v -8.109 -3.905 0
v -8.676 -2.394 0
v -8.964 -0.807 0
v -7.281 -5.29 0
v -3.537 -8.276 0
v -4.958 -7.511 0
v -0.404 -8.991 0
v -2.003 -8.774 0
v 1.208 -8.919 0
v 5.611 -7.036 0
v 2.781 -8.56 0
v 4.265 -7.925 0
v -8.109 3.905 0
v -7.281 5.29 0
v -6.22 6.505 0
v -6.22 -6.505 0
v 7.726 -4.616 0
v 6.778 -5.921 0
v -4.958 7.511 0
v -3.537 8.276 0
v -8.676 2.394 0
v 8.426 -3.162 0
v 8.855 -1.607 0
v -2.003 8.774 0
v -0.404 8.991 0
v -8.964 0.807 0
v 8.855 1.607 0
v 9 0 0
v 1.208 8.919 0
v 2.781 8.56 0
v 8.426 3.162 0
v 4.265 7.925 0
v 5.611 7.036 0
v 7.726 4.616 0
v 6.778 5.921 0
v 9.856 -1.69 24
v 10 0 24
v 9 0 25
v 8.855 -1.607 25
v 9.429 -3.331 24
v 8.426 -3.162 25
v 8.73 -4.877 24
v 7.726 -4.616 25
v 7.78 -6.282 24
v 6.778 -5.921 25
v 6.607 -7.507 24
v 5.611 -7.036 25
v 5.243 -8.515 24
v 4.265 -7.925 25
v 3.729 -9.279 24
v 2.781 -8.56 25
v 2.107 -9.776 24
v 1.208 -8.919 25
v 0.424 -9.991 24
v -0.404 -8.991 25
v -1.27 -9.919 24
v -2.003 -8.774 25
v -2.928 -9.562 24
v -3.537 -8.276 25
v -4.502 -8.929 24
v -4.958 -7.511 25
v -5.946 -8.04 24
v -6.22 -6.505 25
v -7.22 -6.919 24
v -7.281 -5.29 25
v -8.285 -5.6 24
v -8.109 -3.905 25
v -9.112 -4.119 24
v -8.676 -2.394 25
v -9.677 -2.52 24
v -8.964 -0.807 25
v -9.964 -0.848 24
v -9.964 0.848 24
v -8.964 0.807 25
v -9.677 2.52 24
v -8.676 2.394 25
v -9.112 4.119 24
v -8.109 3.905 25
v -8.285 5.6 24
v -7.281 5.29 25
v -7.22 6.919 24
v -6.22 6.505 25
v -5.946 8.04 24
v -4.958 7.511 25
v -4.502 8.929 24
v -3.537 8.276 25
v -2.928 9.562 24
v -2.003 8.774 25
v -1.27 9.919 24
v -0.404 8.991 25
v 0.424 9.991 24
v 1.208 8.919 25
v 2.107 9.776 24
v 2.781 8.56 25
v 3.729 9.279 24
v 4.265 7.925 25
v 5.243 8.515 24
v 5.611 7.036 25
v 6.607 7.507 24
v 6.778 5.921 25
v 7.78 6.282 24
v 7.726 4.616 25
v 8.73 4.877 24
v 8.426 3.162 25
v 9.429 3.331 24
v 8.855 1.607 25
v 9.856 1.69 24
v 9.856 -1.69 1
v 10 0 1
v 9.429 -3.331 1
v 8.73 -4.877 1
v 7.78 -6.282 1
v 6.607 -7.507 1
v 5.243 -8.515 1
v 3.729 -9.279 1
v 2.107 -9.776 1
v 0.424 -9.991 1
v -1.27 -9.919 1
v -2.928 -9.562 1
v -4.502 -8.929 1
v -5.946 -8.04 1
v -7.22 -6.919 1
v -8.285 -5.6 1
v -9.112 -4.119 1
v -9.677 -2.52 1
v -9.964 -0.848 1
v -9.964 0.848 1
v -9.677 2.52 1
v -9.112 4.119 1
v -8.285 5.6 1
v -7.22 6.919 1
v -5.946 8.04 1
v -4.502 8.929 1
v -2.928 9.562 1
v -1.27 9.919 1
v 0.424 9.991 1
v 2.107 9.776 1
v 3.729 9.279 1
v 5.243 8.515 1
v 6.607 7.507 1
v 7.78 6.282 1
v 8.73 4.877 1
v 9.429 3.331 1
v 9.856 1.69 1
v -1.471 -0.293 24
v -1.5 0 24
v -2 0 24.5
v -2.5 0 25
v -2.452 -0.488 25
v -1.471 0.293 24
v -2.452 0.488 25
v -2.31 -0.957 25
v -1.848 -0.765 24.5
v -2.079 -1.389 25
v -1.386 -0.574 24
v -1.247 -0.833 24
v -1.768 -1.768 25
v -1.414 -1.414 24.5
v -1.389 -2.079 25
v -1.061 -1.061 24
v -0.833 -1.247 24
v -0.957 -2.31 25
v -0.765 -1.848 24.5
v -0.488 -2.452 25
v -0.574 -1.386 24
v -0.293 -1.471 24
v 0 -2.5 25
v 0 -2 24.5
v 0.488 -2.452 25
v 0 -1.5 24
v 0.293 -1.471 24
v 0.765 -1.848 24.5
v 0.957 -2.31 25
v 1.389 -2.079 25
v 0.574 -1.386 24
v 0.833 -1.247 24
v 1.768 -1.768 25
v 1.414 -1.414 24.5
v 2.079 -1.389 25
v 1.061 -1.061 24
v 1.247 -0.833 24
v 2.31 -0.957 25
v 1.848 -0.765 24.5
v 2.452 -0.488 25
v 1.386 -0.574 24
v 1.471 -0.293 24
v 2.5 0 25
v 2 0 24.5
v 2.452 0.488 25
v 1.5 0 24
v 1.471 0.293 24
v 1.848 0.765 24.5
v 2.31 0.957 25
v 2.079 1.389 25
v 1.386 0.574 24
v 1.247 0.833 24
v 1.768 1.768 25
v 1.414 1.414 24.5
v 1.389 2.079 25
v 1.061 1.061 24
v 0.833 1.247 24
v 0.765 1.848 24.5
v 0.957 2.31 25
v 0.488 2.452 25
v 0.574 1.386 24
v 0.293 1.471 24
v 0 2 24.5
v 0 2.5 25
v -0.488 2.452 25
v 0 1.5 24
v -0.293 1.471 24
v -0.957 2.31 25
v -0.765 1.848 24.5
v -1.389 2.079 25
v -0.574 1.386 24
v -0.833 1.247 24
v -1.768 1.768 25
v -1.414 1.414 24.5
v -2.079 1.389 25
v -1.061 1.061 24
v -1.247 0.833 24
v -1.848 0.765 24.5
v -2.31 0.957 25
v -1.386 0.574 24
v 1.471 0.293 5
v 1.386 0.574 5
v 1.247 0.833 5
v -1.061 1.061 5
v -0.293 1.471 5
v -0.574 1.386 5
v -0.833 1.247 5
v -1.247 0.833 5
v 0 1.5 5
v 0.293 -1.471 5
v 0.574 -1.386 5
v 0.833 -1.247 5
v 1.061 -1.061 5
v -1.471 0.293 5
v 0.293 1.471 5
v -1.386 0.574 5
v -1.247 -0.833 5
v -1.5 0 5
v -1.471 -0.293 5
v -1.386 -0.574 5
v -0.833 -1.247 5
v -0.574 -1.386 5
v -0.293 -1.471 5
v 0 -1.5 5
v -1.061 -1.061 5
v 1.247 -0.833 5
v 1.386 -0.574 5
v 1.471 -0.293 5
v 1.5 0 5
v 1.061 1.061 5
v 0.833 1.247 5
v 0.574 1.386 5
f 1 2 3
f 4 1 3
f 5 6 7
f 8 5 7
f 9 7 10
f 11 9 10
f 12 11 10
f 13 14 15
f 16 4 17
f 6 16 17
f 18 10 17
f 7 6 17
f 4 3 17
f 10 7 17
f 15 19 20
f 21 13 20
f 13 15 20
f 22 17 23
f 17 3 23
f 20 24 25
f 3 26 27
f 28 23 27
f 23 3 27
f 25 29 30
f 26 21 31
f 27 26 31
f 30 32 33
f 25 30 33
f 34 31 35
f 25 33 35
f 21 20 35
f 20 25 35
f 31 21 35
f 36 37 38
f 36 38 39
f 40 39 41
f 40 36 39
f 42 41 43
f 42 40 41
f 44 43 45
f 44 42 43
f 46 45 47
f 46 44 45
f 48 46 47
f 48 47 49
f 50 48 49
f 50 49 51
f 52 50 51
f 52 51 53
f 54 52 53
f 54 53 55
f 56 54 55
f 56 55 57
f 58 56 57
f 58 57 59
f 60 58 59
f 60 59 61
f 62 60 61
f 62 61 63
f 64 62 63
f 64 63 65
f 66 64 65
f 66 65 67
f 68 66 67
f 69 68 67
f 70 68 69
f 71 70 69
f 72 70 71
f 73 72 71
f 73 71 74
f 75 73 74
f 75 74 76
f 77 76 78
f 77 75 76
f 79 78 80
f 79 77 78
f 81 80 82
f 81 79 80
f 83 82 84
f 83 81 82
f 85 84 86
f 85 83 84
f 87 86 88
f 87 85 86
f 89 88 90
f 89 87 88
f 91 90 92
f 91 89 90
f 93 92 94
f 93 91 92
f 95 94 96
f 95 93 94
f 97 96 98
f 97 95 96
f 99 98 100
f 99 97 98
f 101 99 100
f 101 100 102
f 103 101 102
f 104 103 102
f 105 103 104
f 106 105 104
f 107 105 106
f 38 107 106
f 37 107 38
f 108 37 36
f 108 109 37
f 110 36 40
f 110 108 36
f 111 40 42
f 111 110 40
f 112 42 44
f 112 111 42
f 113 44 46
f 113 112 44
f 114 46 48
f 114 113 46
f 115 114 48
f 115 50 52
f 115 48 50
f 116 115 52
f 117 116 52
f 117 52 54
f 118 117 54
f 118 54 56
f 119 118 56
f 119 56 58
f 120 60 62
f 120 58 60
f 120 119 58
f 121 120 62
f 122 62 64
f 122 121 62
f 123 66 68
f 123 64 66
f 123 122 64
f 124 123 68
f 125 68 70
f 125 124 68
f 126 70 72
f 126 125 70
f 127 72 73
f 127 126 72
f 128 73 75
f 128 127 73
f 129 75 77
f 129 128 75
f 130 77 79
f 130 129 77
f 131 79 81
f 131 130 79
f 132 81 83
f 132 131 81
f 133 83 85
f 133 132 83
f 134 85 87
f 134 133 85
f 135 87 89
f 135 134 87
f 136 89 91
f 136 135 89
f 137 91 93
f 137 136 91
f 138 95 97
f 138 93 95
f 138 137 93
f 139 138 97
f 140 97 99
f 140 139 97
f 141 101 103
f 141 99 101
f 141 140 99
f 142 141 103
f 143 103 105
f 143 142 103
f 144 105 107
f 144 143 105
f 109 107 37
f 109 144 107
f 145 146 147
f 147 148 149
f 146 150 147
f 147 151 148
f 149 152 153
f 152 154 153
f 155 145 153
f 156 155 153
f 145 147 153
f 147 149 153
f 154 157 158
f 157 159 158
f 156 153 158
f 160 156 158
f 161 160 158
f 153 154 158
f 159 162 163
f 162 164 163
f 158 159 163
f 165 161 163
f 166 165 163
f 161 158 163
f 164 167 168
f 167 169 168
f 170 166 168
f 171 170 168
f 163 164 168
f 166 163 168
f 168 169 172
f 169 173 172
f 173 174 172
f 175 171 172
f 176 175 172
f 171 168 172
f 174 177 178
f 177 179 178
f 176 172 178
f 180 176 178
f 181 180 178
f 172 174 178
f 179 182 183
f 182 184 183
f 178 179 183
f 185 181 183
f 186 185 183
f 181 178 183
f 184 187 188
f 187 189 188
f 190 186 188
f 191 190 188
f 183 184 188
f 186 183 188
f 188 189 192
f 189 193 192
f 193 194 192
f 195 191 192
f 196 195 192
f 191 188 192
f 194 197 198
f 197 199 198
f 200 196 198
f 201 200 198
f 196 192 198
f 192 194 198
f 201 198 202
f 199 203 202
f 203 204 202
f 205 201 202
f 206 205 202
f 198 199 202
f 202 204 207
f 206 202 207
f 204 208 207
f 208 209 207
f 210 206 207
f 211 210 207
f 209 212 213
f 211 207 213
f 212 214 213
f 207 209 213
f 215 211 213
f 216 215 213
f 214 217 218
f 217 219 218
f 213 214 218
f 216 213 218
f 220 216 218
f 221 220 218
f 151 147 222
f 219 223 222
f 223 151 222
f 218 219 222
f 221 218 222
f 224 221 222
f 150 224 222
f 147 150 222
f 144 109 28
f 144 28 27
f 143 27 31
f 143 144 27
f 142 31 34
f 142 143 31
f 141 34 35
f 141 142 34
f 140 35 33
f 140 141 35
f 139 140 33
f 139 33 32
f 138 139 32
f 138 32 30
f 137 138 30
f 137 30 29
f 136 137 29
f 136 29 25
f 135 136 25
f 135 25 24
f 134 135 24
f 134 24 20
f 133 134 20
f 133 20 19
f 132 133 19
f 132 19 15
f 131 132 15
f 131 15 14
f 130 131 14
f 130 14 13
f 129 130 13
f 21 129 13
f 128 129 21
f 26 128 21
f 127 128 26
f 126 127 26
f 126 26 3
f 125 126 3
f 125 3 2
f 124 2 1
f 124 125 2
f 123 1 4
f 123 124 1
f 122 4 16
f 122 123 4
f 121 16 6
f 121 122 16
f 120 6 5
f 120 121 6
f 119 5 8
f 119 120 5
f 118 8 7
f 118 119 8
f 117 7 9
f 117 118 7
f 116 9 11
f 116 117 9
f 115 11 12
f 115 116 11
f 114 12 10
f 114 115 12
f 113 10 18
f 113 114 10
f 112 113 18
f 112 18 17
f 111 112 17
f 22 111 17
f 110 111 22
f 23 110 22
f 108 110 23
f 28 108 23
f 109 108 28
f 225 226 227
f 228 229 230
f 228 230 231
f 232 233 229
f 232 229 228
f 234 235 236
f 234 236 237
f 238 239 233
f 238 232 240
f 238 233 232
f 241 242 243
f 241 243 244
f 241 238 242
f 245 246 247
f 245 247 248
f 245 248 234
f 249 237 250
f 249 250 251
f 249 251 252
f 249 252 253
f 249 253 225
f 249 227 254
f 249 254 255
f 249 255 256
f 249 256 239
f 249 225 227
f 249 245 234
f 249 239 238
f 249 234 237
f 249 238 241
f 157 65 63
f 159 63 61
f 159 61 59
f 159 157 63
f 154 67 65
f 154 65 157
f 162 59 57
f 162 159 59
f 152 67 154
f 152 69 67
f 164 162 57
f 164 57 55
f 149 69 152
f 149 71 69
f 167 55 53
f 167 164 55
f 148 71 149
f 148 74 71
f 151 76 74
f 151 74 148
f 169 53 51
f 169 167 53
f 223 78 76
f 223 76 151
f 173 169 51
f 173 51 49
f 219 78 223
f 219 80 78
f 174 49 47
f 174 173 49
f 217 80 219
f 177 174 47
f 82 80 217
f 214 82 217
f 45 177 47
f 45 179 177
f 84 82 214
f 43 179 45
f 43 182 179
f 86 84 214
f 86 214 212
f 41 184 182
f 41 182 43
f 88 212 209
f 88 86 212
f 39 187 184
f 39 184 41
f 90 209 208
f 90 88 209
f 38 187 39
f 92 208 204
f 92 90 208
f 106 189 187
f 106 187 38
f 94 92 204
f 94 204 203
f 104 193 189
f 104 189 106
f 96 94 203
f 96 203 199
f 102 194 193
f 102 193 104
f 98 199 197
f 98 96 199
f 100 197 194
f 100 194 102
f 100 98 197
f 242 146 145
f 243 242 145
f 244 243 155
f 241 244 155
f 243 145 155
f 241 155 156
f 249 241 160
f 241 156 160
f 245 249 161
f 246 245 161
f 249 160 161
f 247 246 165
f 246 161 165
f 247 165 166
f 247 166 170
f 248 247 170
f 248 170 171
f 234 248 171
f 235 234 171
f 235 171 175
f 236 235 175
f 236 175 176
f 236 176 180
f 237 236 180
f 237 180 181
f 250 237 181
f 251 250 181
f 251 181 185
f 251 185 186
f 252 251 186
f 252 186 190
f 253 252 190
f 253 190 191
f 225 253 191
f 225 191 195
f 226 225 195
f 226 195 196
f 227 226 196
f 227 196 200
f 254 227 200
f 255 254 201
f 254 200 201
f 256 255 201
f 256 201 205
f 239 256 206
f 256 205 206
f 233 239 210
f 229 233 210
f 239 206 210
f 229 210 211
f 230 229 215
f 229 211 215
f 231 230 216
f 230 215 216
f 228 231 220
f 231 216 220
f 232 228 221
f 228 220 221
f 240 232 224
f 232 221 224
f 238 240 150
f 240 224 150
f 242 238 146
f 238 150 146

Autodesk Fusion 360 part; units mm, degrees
sketch "Sketch1" plane through (0, 0, 0) normal (0, 0, 1) x (1, 0, 0)
  circle A0 centre (0, 0) radius 10
  dimension "d1" = 20
extrude "Extrude1" add sketch "Sketch1" along normal blind 25
sketch "Sketch2" plane through (0, 0, 25) normal (0, 0, 1) x (-1, 0, 0)
  circle A0 centre (0, 0) radius 10
  circle A1 centre (0, 0) radius 1.5
  dimension "d4" = 3
extrude "Extrude2" cut sketch "Sketch2" against normal blind 20 contours A1
chamfer "Chamfer1" distance 1 angle 45 2 faces at (7.1294, -0.4968, 25) (2.3712, -3.5556, 0)
